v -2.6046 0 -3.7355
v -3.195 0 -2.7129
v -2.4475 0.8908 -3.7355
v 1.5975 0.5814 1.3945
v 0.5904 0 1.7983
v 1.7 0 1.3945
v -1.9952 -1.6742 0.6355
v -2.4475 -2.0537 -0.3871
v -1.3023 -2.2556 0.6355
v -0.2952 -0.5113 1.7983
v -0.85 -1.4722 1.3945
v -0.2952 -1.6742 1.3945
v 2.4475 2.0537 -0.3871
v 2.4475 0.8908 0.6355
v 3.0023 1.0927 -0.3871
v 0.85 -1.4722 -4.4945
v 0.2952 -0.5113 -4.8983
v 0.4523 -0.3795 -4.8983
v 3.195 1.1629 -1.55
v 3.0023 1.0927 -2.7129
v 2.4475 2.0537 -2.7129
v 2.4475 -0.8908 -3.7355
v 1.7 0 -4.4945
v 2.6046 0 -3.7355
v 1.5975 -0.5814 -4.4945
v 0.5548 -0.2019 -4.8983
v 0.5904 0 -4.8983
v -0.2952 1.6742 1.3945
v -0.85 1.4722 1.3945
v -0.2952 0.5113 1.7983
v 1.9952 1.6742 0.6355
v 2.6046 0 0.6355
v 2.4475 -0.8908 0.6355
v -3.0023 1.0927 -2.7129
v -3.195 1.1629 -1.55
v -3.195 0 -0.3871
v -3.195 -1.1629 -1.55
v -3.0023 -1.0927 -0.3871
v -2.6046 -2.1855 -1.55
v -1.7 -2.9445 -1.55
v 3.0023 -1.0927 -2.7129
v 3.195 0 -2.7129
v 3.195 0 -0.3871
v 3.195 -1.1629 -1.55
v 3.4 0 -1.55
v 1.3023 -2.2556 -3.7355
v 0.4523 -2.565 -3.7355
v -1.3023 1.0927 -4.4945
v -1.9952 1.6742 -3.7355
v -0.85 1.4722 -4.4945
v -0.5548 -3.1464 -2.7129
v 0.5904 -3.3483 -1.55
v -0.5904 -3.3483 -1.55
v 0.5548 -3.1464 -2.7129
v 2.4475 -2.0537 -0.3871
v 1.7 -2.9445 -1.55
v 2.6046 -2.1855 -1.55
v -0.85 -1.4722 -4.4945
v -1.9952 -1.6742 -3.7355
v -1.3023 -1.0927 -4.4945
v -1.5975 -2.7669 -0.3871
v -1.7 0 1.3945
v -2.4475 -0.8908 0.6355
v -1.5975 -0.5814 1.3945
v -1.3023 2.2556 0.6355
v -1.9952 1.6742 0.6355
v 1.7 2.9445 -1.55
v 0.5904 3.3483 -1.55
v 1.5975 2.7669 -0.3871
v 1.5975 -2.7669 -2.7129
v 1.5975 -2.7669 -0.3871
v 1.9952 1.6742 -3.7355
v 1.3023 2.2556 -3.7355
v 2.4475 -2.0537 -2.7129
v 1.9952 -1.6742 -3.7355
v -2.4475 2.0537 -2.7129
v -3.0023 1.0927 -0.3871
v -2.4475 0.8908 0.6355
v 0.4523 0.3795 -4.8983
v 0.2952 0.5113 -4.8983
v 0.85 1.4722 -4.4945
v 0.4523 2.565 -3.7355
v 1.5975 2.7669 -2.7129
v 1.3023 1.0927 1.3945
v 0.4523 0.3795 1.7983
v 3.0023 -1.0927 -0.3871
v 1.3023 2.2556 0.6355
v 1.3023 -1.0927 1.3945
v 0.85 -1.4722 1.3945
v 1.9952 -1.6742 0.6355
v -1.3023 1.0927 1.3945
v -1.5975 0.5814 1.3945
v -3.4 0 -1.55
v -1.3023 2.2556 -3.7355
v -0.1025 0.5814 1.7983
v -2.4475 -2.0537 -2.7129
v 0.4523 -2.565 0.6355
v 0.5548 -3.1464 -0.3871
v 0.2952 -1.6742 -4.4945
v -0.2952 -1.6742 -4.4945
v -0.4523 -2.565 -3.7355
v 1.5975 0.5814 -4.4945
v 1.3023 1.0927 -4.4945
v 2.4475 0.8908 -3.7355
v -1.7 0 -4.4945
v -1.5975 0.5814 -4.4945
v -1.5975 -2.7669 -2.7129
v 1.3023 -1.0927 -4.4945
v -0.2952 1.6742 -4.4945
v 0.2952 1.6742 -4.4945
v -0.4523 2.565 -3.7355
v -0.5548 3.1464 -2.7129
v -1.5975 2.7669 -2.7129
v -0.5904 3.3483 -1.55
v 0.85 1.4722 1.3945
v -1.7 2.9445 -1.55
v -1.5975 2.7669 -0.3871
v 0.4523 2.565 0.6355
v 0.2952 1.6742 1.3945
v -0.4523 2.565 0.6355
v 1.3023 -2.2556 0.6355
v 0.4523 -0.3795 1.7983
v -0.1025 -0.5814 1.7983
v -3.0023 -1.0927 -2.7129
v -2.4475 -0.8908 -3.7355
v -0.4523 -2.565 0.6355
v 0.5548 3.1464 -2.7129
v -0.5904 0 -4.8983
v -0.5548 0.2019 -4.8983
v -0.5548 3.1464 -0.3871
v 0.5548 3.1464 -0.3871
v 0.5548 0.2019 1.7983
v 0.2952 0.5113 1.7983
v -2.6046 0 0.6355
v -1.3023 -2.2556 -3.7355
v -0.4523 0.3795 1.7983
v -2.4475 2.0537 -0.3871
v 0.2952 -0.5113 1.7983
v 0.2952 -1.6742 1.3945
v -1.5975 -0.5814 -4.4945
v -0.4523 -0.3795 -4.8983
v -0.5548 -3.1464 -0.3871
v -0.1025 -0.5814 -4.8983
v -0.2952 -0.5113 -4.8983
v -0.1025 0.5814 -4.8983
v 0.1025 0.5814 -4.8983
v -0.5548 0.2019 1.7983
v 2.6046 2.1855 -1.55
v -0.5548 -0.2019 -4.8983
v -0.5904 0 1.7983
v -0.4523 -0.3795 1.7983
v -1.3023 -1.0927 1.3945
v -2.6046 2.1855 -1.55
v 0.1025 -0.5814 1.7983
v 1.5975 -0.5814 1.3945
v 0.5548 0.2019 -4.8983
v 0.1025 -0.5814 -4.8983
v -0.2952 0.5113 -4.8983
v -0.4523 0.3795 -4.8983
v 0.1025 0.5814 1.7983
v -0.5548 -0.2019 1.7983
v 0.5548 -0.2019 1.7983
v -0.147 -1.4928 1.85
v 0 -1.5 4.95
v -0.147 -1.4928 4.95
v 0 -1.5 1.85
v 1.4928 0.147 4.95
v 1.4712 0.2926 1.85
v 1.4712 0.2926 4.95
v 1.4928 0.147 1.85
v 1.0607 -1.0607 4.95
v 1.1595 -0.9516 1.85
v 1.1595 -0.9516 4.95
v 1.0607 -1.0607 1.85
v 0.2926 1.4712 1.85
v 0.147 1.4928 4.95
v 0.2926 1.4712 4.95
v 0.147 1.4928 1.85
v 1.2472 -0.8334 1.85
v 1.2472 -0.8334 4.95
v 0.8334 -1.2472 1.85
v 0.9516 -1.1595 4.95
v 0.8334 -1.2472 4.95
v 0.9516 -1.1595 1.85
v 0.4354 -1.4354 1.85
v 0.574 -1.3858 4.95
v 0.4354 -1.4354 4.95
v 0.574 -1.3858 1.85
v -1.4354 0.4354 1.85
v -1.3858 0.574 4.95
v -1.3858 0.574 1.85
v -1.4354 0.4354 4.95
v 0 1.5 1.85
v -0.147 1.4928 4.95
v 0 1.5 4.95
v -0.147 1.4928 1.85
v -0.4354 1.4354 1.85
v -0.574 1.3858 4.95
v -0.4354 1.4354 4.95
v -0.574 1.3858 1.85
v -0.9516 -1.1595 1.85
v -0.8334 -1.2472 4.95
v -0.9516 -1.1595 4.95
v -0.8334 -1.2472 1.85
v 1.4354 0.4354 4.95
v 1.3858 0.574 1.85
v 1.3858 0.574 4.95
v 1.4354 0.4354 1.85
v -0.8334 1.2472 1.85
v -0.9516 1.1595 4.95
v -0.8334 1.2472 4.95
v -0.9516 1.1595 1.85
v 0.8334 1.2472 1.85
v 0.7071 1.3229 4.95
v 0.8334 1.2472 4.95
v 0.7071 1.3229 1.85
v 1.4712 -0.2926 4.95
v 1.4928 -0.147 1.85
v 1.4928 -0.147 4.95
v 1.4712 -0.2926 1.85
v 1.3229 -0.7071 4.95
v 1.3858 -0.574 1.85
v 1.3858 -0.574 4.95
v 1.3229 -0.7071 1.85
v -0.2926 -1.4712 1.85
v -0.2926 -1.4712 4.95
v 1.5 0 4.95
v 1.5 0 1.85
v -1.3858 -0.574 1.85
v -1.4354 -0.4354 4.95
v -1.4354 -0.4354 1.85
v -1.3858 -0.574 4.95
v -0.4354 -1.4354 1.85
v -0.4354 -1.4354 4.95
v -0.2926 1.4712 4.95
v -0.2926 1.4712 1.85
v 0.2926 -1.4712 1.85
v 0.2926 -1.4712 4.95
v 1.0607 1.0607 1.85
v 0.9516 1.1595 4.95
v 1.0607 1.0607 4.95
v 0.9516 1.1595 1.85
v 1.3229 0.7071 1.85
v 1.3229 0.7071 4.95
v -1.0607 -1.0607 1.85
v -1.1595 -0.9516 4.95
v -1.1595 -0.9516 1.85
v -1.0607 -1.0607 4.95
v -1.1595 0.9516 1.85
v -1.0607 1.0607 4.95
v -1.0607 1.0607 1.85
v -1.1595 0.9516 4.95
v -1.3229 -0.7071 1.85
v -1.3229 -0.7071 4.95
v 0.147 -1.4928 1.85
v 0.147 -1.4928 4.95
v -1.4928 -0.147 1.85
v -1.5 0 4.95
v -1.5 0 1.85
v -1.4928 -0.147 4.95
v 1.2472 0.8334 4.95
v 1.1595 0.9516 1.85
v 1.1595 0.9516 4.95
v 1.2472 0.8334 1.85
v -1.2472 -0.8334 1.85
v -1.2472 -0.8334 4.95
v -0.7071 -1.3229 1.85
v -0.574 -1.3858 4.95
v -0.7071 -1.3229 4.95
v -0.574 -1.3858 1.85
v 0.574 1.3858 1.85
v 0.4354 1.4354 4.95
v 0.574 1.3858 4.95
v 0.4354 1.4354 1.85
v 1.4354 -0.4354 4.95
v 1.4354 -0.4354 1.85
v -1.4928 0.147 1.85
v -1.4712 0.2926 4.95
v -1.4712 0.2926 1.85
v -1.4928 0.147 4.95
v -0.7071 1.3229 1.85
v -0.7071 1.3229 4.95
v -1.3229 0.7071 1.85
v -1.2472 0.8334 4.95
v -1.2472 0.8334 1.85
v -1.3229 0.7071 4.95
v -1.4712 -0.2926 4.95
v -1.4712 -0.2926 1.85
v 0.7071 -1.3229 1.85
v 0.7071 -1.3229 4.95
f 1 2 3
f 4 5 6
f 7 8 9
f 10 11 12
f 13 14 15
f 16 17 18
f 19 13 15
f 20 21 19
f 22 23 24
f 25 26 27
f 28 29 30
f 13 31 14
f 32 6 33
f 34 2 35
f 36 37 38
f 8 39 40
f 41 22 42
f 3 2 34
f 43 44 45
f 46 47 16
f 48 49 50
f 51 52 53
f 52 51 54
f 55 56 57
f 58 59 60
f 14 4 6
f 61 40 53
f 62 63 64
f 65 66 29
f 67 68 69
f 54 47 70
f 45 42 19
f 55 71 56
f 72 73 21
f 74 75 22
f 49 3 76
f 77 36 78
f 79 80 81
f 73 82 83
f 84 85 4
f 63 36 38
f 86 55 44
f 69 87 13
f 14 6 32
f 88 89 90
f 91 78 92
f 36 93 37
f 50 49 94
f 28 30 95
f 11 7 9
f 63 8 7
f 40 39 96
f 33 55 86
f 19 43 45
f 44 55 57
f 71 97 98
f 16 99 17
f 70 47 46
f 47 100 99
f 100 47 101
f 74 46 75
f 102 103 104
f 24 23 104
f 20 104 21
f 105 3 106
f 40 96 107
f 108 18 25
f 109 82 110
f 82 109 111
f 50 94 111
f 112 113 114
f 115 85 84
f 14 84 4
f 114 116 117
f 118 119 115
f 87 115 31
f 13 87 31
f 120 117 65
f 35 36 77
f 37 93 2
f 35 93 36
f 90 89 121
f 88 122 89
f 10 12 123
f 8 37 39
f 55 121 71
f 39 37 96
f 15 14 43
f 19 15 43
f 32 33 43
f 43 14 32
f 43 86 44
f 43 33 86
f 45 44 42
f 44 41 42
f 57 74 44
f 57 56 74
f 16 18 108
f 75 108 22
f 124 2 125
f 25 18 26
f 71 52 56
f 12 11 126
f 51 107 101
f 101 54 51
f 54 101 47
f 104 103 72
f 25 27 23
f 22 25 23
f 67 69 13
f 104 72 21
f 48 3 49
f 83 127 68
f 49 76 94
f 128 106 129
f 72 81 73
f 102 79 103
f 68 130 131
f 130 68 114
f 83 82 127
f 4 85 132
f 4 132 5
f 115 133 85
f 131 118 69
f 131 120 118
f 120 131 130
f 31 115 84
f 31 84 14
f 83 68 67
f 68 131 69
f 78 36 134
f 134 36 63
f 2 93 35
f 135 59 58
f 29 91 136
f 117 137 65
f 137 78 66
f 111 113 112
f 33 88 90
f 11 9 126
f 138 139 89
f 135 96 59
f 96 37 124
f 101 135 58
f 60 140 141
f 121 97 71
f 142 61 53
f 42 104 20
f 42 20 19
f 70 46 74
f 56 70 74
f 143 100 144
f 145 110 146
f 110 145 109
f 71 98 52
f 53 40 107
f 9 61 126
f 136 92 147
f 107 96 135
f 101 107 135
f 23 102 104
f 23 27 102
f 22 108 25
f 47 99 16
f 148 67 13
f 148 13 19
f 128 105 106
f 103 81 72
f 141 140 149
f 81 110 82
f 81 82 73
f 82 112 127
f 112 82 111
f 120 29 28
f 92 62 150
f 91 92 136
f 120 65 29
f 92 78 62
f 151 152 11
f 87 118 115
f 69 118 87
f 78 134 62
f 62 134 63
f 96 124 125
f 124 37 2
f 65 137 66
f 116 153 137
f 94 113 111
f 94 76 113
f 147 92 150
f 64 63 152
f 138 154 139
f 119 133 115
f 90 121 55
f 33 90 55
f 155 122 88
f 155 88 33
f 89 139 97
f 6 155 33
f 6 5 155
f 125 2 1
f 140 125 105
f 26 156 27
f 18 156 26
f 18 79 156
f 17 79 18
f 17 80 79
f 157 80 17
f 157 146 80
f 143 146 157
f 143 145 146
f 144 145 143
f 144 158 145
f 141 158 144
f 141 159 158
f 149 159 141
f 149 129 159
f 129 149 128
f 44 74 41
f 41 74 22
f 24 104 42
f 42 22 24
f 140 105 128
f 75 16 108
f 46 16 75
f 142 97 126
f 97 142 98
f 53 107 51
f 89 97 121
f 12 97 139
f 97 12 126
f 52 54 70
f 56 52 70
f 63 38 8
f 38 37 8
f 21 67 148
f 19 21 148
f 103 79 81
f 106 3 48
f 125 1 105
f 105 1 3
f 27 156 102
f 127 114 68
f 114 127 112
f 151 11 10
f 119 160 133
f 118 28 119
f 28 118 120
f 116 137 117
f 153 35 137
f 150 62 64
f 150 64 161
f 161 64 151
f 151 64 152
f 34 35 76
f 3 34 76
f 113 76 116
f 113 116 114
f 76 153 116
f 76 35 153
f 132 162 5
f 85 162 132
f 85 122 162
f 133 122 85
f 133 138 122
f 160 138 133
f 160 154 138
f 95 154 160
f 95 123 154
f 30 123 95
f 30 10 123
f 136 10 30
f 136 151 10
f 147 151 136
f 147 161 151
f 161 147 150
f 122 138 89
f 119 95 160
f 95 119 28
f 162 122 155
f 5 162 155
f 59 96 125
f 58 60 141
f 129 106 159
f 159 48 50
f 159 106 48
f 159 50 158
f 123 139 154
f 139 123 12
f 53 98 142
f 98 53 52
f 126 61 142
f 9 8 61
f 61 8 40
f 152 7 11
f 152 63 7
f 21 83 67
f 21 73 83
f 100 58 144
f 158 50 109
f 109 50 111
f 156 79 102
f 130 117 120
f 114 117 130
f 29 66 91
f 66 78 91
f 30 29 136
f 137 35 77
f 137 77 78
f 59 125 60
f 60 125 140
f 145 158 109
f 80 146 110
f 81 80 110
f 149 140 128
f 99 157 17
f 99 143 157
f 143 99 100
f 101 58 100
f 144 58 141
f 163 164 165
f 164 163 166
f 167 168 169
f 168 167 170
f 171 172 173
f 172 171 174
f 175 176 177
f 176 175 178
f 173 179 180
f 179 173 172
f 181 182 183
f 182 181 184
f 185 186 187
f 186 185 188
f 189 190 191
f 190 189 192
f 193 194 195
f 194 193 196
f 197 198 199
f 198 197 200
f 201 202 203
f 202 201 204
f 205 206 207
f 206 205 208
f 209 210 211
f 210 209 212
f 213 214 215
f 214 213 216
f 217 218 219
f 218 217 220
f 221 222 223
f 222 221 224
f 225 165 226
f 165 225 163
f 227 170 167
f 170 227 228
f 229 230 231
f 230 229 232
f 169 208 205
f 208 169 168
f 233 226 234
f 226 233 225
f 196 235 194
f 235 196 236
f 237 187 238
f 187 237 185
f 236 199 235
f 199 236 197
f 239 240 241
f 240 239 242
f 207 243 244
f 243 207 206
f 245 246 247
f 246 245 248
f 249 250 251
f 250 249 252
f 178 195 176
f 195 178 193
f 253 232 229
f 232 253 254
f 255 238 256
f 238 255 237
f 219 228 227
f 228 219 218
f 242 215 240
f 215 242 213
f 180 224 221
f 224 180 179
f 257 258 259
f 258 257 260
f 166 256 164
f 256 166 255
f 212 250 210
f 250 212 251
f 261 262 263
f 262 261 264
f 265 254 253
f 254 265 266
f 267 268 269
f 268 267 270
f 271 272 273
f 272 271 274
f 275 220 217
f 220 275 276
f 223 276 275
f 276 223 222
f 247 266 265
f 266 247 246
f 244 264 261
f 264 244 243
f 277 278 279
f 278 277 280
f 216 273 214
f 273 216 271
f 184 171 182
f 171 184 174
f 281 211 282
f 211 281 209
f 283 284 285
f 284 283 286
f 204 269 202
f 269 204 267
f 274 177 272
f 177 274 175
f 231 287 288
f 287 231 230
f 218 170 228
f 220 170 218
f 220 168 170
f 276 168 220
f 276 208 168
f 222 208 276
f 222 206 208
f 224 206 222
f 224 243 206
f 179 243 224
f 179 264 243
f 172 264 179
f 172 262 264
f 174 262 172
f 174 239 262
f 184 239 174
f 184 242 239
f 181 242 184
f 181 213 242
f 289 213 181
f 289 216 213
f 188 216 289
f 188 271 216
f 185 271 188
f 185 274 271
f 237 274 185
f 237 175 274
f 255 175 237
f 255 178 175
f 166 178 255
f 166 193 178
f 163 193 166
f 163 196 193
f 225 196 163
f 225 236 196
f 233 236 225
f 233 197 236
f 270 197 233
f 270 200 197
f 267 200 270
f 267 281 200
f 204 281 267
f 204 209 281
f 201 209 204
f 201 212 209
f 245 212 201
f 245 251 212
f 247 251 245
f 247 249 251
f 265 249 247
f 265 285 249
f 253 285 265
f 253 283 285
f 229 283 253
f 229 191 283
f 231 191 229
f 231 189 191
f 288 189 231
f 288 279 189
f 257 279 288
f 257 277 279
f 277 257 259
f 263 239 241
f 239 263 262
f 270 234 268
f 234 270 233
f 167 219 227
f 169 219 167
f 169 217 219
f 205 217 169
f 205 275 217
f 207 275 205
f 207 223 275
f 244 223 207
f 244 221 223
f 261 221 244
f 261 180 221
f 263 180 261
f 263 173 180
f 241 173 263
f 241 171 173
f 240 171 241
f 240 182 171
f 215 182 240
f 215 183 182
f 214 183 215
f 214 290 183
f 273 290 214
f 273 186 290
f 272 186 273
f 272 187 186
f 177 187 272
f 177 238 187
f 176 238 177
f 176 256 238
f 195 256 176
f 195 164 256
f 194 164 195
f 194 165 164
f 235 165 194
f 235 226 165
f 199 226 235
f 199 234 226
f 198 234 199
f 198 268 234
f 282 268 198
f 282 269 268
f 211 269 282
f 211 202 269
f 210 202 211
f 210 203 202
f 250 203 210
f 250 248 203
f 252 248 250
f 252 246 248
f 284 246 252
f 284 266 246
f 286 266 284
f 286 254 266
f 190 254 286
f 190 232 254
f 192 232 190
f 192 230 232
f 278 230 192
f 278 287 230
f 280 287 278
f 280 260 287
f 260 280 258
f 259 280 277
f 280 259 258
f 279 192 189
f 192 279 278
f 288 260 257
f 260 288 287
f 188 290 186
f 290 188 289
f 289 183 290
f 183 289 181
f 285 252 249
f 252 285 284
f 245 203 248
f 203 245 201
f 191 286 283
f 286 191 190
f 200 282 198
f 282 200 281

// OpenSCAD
$fn=64;

bbox_xy = 6.8;
bbox_z  = 9.9;

sphere_d = 6.8;
sphere_r = sphere_d/2;

stem_d = 3.0;
stem_r = stem_d/2;

stem_h = bbox_z - sphere_d;

module faceted_sphere(r, facets=18){
    sphere(r=r, $fn=facets);
}

module stem(r, h){
    cylinder(r=r, h=h, center=false, $fn=64);
}

union(){
    translate([0,0,-bbox_z/2 + sphere_r])
        faceted_sphere(sphere_r, facets=18);

    translate([0,0,-bbox_z/2 + sphere_d])
        stem(stem_r, stem_h);
}
